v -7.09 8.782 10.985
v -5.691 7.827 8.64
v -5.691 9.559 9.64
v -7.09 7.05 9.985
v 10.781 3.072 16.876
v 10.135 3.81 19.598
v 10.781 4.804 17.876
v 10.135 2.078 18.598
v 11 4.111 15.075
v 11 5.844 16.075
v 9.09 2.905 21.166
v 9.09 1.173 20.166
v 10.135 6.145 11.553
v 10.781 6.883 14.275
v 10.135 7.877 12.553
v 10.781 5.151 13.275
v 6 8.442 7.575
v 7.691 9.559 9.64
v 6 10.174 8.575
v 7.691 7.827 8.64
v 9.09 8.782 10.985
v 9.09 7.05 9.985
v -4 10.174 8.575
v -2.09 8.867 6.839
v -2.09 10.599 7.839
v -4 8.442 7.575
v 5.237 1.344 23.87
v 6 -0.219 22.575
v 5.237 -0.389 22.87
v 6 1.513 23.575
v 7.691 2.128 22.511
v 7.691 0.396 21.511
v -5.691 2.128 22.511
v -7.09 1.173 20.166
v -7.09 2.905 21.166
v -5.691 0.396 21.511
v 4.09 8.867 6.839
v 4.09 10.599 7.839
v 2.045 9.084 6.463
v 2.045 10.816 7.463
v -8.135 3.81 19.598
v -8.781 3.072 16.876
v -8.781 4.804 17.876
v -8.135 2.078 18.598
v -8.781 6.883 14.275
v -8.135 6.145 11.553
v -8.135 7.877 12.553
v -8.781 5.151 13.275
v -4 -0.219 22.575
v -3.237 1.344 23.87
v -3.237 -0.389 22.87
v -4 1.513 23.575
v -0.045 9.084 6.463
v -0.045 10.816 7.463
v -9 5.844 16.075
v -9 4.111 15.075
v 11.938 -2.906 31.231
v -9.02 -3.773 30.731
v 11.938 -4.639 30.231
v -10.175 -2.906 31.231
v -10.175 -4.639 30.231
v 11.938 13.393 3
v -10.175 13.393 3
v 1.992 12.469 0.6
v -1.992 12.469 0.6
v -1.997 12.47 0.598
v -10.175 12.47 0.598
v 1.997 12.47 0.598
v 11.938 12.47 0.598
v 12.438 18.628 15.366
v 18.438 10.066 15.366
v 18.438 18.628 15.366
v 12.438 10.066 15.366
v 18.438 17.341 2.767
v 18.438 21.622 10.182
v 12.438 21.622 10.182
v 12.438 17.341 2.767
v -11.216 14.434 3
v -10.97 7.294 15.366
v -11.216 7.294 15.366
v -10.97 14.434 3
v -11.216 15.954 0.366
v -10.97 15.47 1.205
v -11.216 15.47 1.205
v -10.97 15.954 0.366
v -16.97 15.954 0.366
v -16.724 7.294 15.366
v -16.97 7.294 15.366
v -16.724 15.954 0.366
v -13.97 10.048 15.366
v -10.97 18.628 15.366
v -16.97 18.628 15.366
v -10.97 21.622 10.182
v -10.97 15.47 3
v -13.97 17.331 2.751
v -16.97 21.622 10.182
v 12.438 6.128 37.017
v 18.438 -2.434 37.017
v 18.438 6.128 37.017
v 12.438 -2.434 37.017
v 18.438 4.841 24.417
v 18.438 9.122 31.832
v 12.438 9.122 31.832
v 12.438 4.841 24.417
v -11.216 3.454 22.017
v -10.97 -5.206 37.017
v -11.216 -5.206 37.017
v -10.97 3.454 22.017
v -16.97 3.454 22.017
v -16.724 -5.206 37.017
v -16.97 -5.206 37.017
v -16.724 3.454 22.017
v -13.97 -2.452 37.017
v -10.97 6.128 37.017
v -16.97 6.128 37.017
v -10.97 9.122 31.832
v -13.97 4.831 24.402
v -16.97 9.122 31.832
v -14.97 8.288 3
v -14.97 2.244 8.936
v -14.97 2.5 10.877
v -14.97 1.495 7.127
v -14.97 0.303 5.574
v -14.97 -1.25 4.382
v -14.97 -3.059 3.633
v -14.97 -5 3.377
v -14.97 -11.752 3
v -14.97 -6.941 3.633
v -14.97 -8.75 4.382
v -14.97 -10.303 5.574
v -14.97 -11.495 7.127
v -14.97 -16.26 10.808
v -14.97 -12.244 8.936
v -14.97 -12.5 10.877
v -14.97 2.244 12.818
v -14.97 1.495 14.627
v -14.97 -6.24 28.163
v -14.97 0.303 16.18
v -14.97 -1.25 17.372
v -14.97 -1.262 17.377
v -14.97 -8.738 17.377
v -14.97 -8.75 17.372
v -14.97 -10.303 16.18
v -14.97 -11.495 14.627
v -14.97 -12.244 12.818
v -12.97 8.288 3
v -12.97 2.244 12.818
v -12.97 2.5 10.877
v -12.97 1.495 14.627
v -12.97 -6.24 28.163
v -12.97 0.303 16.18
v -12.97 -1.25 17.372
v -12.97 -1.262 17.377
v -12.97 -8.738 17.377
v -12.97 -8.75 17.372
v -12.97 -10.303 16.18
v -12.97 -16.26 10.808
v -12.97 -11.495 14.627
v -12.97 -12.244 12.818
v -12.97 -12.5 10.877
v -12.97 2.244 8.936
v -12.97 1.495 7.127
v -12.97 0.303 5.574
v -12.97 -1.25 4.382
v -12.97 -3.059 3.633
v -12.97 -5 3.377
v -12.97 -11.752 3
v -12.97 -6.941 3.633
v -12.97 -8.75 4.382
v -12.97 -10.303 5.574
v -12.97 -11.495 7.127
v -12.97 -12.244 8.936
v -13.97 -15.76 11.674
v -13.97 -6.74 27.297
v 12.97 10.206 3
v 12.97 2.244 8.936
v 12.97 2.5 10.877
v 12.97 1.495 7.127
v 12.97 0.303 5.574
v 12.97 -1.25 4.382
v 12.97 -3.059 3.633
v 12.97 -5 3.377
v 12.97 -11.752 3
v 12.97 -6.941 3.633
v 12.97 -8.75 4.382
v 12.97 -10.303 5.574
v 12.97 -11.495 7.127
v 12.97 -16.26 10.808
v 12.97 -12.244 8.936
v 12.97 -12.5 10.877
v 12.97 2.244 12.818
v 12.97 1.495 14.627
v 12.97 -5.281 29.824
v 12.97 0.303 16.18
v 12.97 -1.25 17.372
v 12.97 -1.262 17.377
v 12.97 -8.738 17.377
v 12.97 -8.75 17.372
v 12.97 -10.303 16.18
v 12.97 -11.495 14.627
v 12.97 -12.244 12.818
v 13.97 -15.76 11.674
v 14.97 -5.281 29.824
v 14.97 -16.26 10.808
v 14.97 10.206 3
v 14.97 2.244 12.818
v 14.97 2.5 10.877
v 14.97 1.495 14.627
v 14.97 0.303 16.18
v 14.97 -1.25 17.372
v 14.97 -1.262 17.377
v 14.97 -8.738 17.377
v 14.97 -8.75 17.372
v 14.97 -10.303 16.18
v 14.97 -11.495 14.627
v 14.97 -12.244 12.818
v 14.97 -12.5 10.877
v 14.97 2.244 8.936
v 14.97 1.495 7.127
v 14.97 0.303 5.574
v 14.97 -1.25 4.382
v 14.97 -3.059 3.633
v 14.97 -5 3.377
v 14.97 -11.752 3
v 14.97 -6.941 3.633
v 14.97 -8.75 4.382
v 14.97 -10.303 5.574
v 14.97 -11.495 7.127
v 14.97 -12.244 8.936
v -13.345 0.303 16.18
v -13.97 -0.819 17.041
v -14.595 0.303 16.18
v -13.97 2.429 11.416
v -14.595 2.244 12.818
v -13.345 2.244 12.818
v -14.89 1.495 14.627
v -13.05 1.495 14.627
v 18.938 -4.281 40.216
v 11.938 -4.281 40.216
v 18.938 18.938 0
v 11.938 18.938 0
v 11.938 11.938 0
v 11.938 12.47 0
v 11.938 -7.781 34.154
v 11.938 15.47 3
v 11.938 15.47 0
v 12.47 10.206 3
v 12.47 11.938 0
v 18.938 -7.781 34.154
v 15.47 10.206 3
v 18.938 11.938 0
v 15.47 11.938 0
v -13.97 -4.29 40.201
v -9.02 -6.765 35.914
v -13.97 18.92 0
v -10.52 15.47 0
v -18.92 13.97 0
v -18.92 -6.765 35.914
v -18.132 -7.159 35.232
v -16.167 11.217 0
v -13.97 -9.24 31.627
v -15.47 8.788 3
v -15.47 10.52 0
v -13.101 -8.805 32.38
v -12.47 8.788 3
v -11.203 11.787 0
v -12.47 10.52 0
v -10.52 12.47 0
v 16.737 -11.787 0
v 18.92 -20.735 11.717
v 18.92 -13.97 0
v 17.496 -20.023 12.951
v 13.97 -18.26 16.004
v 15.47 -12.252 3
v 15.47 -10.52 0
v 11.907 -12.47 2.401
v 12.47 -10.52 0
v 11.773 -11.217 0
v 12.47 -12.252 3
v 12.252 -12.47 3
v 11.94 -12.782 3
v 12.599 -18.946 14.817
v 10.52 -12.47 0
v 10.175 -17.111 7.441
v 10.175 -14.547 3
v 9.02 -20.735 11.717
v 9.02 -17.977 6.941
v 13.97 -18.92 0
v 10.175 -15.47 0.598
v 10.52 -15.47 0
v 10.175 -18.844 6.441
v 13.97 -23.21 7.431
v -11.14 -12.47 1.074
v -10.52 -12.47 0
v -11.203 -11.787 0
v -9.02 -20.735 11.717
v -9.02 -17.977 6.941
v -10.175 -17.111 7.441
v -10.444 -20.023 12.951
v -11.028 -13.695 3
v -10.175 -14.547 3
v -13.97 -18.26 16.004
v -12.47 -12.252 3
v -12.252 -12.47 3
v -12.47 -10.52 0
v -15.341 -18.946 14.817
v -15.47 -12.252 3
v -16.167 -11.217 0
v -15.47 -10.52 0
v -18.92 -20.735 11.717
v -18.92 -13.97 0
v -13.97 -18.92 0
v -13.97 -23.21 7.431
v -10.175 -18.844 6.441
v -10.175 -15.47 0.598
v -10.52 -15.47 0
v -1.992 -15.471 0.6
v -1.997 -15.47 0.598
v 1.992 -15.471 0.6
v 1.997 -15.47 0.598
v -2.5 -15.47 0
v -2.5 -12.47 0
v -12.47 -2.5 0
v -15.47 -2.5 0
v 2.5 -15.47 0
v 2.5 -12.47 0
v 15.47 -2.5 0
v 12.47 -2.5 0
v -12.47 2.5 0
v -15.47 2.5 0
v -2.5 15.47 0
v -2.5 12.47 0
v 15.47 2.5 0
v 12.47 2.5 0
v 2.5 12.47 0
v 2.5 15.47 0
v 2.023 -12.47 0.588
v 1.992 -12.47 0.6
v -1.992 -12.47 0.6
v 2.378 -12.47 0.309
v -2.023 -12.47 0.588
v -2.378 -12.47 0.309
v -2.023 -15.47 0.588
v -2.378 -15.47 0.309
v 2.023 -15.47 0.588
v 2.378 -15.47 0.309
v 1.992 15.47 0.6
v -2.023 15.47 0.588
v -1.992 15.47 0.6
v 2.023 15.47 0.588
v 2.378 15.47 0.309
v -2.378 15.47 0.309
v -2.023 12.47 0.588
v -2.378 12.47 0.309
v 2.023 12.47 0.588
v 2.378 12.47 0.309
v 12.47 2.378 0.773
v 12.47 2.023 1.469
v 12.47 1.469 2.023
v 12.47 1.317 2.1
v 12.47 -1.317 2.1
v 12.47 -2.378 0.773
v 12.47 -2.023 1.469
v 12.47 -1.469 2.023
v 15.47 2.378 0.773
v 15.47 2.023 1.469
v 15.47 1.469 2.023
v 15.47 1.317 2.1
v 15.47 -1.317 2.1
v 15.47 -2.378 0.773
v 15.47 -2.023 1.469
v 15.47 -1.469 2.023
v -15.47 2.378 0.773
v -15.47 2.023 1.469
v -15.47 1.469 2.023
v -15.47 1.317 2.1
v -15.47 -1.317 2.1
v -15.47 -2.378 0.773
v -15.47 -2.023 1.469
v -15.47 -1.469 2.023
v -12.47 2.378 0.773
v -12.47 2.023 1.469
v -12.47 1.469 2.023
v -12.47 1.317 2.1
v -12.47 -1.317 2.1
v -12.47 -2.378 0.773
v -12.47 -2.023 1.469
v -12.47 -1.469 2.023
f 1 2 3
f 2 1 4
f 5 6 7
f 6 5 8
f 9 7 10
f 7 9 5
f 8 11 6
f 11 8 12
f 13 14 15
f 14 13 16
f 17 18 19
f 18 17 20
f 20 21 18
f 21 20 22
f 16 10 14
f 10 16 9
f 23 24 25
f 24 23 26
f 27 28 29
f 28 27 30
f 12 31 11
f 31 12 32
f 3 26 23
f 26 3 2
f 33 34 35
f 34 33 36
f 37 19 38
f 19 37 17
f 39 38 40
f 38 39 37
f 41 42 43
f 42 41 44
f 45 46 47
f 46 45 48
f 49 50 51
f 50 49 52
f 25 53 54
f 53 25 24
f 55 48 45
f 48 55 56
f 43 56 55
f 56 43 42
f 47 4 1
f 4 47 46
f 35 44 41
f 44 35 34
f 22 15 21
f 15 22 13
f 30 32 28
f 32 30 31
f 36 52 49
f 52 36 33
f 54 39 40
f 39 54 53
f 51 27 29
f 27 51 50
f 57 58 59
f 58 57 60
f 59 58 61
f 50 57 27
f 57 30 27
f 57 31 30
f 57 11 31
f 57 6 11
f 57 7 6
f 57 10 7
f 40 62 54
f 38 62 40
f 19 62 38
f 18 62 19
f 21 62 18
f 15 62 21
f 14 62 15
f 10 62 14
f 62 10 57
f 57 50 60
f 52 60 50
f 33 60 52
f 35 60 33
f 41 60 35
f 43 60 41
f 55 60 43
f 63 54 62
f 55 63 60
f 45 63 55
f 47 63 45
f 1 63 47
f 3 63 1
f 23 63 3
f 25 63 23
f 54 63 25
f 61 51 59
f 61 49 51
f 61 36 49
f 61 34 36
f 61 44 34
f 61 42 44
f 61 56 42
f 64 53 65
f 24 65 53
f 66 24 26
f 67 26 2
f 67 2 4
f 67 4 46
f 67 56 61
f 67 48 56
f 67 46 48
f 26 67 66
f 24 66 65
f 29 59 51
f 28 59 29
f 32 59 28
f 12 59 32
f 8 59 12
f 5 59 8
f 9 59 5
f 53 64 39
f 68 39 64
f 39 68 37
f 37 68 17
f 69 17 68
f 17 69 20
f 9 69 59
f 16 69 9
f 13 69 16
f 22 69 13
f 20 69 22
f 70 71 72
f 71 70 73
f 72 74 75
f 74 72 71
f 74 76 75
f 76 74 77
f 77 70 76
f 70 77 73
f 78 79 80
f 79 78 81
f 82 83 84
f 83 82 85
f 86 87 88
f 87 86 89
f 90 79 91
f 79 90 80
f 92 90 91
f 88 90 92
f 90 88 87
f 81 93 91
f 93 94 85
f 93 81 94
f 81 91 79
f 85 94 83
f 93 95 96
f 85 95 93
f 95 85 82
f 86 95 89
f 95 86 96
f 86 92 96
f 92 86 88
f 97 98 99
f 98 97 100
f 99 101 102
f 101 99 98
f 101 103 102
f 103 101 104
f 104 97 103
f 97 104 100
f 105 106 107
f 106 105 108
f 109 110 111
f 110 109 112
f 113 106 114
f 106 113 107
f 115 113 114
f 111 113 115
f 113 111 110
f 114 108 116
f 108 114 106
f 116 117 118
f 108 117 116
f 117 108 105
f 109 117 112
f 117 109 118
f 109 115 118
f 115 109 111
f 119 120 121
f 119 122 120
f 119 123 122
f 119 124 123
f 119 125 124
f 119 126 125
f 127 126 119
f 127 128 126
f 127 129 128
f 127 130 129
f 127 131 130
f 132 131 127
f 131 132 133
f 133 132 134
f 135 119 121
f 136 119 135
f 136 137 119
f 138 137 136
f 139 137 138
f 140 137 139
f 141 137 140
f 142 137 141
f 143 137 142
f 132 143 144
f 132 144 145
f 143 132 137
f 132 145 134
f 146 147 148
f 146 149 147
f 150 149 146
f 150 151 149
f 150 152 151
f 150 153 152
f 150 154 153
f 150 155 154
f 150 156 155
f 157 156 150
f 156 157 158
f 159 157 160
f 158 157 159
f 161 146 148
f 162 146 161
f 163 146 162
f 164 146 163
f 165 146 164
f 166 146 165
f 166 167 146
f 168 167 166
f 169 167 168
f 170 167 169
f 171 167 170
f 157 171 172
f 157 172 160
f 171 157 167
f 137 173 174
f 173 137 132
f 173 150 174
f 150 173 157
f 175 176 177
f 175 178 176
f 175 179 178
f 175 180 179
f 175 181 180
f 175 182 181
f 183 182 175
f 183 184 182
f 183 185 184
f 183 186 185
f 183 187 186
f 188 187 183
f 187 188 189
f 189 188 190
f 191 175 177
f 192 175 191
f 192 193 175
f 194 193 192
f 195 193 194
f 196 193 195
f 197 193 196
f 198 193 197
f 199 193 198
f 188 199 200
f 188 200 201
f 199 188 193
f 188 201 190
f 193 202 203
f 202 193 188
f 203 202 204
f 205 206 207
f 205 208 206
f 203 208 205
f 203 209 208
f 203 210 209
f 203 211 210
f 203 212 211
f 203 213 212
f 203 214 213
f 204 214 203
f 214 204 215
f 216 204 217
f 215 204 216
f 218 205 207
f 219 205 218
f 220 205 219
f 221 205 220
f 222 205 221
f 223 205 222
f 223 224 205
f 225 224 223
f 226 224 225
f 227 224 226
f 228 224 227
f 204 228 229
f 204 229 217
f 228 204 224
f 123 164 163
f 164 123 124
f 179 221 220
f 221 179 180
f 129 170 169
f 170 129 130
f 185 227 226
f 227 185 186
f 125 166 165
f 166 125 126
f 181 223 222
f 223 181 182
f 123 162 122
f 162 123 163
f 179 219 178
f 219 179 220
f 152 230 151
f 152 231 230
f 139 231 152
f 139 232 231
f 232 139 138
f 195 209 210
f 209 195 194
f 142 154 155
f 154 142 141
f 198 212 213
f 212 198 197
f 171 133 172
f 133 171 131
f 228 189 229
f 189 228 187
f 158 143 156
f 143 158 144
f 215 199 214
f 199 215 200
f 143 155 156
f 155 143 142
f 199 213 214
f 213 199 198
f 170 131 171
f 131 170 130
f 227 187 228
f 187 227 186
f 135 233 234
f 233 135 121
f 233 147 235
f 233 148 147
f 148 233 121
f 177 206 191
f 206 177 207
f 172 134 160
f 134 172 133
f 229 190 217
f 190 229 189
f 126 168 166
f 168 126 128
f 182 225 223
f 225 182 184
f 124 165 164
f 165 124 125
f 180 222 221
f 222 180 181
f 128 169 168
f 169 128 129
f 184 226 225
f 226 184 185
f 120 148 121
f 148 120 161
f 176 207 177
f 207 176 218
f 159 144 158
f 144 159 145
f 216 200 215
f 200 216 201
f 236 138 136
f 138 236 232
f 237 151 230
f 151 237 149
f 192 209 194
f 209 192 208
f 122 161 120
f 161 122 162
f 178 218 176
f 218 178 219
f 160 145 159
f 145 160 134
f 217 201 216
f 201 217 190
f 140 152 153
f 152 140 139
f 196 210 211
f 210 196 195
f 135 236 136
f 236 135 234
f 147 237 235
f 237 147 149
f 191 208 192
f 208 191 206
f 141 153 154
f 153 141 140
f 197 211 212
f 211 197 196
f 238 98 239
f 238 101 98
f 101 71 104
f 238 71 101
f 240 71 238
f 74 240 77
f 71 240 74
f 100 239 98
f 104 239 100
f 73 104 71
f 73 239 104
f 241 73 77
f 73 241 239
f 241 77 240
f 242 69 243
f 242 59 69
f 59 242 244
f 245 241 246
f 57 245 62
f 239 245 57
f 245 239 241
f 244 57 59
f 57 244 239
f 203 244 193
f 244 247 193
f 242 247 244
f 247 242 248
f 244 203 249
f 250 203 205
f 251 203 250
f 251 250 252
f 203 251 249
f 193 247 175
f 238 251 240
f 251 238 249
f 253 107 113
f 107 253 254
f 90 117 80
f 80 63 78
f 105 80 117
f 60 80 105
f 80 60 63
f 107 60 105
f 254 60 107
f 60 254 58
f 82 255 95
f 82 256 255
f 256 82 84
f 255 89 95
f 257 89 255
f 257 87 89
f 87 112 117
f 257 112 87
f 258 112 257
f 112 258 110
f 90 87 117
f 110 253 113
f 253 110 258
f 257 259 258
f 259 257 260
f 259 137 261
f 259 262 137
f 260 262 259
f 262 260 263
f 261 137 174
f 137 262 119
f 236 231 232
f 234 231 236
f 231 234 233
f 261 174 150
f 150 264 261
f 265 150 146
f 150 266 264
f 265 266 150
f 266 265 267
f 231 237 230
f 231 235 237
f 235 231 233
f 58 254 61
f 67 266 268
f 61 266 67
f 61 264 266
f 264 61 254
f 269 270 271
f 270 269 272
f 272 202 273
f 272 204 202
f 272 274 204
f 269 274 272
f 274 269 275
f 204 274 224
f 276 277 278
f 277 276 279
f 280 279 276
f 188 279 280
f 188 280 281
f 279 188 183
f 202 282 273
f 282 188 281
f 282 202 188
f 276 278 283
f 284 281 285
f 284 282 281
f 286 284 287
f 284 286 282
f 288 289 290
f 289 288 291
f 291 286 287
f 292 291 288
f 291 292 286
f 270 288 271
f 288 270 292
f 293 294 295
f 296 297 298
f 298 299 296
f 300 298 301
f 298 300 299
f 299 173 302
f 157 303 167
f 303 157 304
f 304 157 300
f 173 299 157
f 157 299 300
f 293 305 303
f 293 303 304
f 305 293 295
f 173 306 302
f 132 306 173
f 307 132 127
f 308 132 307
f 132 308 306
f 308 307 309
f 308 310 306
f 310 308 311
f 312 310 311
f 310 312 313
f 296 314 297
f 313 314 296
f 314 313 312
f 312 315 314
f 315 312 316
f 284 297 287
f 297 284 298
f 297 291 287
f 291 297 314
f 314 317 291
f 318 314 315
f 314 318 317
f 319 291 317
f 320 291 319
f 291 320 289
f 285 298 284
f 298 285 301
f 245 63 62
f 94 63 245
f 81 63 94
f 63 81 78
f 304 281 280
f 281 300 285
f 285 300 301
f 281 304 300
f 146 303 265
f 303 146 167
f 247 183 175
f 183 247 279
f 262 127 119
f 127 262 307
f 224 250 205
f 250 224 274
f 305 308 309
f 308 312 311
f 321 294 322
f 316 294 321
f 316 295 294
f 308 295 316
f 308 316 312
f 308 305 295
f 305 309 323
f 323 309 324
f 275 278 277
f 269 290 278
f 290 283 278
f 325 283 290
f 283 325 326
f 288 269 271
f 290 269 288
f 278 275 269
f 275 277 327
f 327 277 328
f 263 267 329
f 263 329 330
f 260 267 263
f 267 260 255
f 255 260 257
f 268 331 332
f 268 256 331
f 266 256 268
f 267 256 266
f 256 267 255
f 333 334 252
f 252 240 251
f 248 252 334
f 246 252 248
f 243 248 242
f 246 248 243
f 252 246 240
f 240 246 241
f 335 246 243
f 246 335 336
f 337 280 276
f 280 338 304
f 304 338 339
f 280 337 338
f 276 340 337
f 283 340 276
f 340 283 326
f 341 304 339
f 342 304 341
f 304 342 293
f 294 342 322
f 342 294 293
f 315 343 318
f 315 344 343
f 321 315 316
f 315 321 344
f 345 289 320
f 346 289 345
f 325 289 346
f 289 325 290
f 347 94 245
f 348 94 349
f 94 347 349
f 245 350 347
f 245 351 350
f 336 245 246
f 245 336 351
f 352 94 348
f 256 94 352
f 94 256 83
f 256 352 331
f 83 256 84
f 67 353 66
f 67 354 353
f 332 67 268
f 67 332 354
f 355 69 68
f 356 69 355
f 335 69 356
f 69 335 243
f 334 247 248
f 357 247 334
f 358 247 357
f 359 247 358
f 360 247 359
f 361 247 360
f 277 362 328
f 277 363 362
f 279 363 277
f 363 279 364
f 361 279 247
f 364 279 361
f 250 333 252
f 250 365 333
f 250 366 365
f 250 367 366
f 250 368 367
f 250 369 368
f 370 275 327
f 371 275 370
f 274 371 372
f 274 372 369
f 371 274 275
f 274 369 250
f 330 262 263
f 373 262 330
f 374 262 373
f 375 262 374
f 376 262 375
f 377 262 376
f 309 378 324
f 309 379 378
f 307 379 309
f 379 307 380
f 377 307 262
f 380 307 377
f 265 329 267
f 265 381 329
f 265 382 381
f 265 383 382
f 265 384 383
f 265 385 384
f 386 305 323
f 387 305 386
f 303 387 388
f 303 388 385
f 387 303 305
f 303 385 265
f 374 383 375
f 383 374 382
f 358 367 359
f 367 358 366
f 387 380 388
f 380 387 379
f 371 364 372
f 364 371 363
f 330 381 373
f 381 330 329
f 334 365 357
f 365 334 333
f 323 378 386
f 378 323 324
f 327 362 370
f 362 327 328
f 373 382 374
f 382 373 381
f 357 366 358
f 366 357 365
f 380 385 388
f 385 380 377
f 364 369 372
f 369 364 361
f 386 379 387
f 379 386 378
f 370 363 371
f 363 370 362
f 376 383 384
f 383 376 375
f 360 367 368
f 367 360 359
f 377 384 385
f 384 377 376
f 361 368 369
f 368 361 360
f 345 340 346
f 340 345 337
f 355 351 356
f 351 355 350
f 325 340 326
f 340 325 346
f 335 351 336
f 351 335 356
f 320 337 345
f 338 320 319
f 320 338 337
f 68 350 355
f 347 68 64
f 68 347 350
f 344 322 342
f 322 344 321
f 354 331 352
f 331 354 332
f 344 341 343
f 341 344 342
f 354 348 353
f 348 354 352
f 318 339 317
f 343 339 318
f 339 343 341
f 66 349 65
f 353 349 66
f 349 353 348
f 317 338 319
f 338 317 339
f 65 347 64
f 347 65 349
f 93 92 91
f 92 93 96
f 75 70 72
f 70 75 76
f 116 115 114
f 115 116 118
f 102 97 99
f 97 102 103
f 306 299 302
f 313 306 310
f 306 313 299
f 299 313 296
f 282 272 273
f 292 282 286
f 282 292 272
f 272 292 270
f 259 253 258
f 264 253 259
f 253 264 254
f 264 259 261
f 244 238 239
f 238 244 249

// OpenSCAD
side = 7;

diamond_offset = 13.97;
square_offset = 11.938;

//diamond_center = diamond_offset + 7 / sqrt(2);
square_center = square_offset + 3.5;

slope = 30;
triangle = 55 / sqrt(3);

module board() {
    translate([-1,  1] * diamond_offset) face();
    translate([ 1, -1] * diamond_offset) face();
    translate([-1, -1] * diamond_offset) face();

    translate([1, 1] * square_offset) square(side);

    module face() {
        rotate(45) square(side, center=true);
    }
}

intersection() {
    union() {
        rotate([slope, 0, 0]) linear_extrude(100, center=true, convexity=2)
        rotate([-slope, 0,0]) board();

        rotate([slope, 0, 0]) difference() {
            translate([0, diamond_offset * sqrt(3) / 2, 0])
                cube([diamond_offset * 2, 2, 57], center=true);
            translate([1, 0, 11]) rotate([90, 0, 0]) intersection() {
                cylinder(r = 10, h=100, center=true);
                translate([0, -2, 0]) cube([22, 22, 100], center=true);
            }
        }

        rotate([slope, 0, 0]) {
            translate([square_center, 19, 1]) runner();
            translate([-diamond_offset, 19, 1]) runner();
            translate([square_center, 19, 26]) runner();
            translate([-diamond_offset, 19, 26]) runner();
        }

        rotate([slope, 0, 0]) translate([0, -diamond_offset * sqrt(3) / 2, 0])
        cube([diamond_offset * 2, 2, 30], center=true);

        difference() {
            union() {
                translate([-diamond_offset, 0, 0]) skew();
                translate([ diamond_offset, 0, 0]) skew();
            }
            intersection() {
                translate([0, -5, triangle/2-5]) rotate([0, 90, 0])
                    cylinder(r=7.5, h=60, center=true);
                translate([0, -5, triangle/2-6.5])
                    cube([60, 16, 16], center=true);
            }
        }

        translate([0, -diamond_offset, 0]) strut();
        translate([0,  diamond_offset, 0]) strut();
        translate([diamond_offset, 0, 0]) rotate(90) strut();
        translate([-diamond_offset, 0, 0]) rotate(90) strut();
    }

    difference() {
        translate([0, 0, triangle/2]) rotate([0, -90, 0])
            cylinder(r = triangle, h = 51, $fn = 3, center=true);
        intersection() {
            rotate([0, 90, 0]) cylinder(r=2.5, h=60, center = true, $fn=20);
            cube([50, 5, 4.2], center=true);
        }
        intersection() {
            rotate([90, 0, 0]) scale([1, 0.4, 1])
                cylinder(r=2.5, h=60, center = true, $fn=20);
            cube([5, 59, 1.2], center=true);
        }
    }
}

module skew() {
    rotate([slope, 0, 0])
        multmatrix([[1, 0, 0], [0, 1, 0], [0, 1/sqrt(3), 1]])
        cube([2, diamond_offset * 2, 45], center=true);
}

module strut() {
    thick = 3;
    translate([0, 0, thick/2]) cube([diamond_offset * 2, thick, thick], center=true);
}

module runner() {
    rotate([90, 0, 90]) cylinder(r=10, h=6, center=true, $fn=3);
}
